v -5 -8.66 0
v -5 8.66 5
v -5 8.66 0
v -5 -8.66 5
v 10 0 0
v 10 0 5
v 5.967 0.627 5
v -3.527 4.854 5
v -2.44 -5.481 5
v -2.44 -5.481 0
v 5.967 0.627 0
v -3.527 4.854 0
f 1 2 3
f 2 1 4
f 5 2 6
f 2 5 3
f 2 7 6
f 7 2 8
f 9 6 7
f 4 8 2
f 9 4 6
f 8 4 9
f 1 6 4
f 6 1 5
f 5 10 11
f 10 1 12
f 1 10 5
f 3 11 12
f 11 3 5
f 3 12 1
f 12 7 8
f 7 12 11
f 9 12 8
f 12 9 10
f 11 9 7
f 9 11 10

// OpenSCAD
difference() {
	cylinder(r=10, h=5, $fn=3);
	translate([0, 0, -1]) {
		rotate([0, 0, 6]) {
			cylinder(r=6, h=7, $fn=3);
		}
	}
}
